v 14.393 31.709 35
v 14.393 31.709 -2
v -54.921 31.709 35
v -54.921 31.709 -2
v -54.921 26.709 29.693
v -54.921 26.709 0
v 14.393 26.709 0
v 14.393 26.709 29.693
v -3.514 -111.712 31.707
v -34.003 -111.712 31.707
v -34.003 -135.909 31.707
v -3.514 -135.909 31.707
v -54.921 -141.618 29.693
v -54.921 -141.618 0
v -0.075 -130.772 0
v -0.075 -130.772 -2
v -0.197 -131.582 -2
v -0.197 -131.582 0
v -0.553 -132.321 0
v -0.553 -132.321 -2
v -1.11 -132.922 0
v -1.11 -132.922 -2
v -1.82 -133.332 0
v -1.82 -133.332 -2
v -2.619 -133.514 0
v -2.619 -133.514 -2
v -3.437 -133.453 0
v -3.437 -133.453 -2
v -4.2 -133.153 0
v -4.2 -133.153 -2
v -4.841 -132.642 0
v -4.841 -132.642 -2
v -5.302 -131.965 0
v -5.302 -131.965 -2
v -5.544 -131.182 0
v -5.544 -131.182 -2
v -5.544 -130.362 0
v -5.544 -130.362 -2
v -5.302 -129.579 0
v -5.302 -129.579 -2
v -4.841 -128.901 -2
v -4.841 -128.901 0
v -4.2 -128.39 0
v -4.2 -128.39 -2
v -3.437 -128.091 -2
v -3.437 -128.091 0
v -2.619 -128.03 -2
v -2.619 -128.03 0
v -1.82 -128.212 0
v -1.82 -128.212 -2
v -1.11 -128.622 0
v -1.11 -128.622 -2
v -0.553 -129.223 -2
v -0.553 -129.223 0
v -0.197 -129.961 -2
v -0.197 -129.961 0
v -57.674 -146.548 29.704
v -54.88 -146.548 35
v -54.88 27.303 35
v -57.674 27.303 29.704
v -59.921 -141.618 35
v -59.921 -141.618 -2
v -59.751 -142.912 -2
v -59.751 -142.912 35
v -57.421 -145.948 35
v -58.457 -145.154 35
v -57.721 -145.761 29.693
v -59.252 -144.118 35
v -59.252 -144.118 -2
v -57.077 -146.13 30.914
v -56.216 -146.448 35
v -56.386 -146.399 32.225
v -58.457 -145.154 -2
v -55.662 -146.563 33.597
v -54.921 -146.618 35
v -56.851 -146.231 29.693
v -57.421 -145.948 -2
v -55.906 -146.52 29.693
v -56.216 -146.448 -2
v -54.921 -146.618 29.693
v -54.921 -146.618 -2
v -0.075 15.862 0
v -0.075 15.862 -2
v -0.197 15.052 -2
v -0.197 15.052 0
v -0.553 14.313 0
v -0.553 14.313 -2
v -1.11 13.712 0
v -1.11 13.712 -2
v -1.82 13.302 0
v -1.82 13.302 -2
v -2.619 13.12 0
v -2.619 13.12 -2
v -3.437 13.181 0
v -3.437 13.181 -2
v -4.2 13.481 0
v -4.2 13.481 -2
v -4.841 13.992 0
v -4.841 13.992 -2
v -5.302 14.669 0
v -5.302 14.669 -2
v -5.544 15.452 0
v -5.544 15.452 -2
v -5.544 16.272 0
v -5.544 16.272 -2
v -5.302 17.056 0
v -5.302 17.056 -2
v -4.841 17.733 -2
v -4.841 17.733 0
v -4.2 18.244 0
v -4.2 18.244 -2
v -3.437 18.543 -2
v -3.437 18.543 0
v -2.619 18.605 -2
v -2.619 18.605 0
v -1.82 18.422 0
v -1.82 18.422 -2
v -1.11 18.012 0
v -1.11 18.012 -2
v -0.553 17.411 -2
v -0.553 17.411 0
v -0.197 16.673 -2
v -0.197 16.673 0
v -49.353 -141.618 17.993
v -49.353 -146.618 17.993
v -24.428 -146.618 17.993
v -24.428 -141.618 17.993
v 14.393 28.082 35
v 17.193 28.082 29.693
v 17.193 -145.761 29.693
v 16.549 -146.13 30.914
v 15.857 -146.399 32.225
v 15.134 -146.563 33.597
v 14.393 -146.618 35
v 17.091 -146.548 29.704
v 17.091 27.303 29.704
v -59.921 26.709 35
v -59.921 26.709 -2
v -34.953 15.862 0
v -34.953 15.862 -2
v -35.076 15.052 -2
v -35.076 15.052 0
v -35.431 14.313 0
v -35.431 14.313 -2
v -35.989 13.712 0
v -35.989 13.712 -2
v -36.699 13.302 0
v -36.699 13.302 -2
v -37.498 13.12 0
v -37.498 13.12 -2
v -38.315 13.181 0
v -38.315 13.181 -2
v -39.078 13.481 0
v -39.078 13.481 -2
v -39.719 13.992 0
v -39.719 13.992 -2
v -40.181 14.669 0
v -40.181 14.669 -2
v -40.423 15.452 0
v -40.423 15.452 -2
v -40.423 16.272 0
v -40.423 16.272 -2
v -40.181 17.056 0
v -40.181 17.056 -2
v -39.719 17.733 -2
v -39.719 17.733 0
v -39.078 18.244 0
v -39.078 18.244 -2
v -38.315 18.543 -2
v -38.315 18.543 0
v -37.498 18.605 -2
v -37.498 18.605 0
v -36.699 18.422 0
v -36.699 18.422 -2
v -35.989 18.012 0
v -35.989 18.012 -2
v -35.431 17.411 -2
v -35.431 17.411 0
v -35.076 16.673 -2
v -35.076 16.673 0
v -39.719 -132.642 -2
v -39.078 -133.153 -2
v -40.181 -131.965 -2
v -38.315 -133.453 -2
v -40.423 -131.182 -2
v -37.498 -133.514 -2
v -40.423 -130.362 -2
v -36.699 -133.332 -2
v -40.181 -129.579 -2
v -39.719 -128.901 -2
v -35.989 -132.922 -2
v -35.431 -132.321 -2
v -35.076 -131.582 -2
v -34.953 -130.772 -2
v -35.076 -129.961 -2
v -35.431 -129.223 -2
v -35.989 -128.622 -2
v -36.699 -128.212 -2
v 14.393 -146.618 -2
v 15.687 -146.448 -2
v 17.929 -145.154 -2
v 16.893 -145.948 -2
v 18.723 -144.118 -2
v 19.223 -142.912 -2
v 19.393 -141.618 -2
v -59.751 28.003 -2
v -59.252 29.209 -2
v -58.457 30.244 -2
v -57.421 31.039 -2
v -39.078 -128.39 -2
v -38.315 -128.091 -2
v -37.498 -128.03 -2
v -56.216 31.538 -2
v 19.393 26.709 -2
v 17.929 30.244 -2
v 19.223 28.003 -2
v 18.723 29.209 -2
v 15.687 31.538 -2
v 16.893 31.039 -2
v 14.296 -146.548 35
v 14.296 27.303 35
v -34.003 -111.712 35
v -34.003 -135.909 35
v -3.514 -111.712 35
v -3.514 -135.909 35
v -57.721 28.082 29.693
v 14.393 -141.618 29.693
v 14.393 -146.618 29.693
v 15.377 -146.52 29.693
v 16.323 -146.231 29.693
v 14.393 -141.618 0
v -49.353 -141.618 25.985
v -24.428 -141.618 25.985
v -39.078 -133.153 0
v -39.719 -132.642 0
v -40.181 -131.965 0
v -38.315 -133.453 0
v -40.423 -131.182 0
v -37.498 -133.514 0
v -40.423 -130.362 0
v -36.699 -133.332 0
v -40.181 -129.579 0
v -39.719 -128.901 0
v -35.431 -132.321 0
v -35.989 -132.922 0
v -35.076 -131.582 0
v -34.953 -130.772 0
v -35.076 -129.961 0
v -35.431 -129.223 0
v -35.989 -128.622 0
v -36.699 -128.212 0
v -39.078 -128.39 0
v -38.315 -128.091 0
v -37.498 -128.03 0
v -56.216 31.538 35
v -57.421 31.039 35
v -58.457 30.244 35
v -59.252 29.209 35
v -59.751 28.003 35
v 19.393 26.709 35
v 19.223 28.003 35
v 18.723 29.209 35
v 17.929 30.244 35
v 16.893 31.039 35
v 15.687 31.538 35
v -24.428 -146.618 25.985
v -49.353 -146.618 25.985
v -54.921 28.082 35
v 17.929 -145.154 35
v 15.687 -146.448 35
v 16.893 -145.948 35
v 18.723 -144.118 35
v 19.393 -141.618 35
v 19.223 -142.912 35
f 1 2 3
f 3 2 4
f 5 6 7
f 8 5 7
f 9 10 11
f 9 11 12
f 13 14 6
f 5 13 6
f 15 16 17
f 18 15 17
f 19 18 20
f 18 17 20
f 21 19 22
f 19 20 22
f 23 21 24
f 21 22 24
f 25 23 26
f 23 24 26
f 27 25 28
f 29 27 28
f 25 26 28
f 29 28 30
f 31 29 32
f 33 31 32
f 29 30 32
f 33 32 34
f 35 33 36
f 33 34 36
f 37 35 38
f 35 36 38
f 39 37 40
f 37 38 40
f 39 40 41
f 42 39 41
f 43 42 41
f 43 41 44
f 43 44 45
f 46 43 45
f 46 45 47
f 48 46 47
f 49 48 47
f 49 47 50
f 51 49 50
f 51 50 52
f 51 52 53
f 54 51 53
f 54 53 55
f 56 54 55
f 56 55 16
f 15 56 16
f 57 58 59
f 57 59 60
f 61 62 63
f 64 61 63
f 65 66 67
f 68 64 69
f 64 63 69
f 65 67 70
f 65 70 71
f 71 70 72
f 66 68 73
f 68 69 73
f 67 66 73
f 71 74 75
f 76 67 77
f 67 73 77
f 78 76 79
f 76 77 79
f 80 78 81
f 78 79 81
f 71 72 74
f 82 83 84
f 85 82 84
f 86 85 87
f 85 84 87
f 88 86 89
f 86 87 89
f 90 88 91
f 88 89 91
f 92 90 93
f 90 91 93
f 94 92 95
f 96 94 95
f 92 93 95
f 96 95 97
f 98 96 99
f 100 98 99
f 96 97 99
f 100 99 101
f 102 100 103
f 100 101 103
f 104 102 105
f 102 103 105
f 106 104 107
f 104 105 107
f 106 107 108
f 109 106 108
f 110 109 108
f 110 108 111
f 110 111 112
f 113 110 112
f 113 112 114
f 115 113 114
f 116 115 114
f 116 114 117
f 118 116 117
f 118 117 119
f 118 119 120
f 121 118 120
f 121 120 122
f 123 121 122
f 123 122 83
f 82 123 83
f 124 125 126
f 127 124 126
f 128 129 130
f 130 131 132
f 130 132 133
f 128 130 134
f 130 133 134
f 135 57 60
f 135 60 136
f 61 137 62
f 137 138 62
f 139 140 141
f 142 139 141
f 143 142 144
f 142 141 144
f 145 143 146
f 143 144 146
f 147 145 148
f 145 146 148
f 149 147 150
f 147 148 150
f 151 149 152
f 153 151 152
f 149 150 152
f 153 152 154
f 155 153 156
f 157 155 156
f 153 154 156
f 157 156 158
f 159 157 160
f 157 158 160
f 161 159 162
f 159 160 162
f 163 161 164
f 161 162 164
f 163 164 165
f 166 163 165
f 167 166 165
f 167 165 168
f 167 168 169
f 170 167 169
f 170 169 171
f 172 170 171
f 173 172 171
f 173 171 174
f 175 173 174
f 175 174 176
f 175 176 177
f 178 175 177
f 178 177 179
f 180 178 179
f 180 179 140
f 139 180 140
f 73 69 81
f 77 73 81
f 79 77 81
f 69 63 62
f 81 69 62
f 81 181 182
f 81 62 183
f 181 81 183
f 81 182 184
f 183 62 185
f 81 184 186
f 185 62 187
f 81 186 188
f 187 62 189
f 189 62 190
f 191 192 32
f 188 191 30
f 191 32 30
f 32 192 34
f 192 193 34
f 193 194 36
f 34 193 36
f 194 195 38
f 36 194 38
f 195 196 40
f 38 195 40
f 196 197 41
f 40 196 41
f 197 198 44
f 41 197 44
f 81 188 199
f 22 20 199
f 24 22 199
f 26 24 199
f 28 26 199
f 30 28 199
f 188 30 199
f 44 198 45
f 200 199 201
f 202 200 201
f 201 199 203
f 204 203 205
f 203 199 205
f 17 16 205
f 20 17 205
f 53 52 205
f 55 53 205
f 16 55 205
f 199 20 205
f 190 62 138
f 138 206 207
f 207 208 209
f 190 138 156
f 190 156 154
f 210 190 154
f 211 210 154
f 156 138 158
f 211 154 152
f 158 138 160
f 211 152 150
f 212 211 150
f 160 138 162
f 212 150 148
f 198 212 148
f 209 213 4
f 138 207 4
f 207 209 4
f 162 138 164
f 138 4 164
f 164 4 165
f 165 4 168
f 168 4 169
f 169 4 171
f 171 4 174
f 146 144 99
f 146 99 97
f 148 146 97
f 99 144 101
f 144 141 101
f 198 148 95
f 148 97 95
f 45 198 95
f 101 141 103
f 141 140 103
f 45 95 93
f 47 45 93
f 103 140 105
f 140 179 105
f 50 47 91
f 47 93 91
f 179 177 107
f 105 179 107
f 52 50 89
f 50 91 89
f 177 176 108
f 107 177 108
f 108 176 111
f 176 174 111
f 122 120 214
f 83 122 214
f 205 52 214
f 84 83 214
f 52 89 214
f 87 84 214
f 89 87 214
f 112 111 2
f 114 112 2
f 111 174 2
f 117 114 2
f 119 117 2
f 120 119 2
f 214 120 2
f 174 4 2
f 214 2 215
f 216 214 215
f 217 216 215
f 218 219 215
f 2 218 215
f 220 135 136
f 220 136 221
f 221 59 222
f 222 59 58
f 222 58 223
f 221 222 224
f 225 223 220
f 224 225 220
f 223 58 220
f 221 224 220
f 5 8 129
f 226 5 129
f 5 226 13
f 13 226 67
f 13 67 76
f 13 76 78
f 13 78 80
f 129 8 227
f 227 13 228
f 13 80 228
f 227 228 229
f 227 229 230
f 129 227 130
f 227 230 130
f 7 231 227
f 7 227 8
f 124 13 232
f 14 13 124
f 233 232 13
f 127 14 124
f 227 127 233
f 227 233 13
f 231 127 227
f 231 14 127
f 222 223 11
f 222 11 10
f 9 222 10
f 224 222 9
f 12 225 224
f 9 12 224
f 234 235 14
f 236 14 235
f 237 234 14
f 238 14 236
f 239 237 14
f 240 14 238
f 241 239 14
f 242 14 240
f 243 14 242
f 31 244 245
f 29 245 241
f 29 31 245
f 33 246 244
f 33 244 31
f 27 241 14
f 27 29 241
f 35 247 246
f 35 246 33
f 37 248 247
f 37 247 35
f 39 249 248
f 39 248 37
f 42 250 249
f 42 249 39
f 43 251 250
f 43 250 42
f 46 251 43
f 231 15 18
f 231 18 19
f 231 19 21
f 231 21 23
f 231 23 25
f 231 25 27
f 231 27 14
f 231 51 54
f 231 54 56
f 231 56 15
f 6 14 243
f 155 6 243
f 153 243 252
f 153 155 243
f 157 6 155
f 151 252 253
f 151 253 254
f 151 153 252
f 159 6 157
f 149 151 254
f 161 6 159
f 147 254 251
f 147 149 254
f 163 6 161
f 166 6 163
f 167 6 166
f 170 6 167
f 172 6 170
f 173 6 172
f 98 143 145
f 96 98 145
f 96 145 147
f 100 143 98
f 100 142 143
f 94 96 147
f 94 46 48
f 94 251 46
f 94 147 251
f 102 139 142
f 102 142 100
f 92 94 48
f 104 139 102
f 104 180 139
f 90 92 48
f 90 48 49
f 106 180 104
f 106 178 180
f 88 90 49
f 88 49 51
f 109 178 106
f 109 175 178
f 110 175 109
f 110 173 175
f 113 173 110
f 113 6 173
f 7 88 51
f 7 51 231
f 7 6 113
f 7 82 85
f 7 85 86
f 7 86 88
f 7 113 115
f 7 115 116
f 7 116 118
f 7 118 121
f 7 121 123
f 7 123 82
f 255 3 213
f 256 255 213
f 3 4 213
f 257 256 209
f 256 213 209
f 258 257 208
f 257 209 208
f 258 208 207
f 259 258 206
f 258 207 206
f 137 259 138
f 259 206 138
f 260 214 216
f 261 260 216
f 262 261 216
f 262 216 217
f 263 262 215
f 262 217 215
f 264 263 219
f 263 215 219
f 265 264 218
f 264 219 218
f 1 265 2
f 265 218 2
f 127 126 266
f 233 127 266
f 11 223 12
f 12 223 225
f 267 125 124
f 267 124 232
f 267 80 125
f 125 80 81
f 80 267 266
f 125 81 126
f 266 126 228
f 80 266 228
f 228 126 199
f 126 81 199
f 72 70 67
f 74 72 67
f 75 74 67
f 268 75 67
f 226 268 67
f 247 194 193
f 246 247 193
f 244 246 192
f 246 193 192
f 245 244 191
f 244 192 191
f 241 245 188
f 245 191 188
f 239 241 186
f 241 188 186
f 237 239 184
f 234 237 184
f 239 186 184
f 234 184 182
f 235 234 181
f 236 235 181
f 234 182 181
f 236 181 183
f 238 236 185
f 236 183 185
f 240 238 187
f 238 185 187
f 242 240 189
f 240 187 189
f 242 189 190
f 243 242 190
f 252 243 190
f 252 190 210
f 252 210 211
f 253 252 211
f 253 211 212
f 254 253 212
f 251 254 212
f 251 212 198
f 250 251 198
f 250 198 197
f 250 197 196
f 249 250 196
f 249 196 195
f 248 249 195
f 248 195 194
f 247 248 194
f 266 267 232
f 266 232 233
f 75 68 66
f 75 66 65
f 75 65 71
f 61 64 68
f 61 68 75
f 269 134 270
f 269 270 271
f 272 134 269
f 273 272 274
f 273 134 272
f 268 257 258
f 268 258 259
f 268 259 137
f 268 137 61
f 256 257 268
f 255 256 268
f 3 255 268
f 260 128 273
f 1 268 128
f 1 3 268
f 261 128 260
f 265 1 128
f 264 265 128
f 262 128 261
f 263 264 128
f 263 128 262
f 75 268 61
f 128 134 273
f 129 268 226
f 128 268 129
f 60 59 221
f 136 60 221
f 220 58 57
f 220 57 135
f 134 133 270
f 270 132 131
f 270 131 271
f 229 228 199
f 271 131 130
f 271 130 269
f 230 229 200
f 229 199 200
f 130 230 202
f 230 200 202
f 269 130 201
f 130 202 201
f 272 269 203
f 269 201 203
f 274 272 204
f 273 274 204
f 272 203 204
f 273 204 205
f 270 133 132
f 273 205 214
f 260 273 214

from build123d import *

# Parameters (mm, degrees)
F0_W      = 69.3147265166
F0_H      = 168.3268749714
F1_DEPTH  = 2
F2_DEPTH  = 35
F3_W      = 24.9247029424
F3_H      = 7.9923868179
F4_DEPTH  = 25
F5_W      = 69.3147265166
F5_H      = 5.3065996646
F6_DEPTH  = 174.7
F7_DEPTH  = 174.2
F8_W      = 30.5498873349
F8_H      = 24.2458432913
F9_DEPTH  = 3.3
F10_SCALE = 0.998
F11_R     = 2.75
F12_DEPTH = 25


with BuildPart() as f1:
    # F0 (on Top) → F1 (new body)
    with BuildSketch(Plane.XY):
        with BuildLine():
            Line((14.3932905048, 31.7087098956), (-54.9214360118, 31.7087098956))
            ThreePointArc((-54.9214360118, 31.7087098956), (-58.4569699177, 30.2442438015), (-59.9214360118, 26.7087098956))
            Line((-59.9214360118, 26.7087098956), (-59.9214360118, -141.6181650758))
            ThreePointArc((-59.9214360118, -141.6181650758), (-58.4569699177, -145.1536989817), (-54.9214360118, -146.6181650758))
            Line((-54.9214360118, -146.6181650758), (14.3932905048, -146.6181650758))
            ThreePointArc((14.3932905048, -146.6181650758), (17.9288244107, -145.1536989817), (19.3932905048, -141.6181650758))
            Line((19.3932905048, -141.6181650758), (19.3932905048, 26.7087098956))
            ThreePointArc((19.3932905048, 26.7087098956), (17.9288244107, 30.2442438015), (14.3932905048, 31.7087098956))
        make_face()
        with Locations((-20.2640727535, -57.4547275901)):
            Rectangle(F0_W, F0_H, mode=Mode.SUBTRACT)
        with Locations((-20.2640727535, -57.4547275901)):
            Rectangle(F0_W, F0_H)
    extrude(amount=-F1_DEPTH)

    # F0 (on Top) → F2 (join)
    with BuildSketch(Plane.XY):
        with BuildLine():
            Line((14.3932905048, 31.7087098956), (-54.9214360118, 31.7087098956))
            ThreePointArc((-54.9214360118, 31.7087098956), (-58.4569699177, 30.2442438015), (-59.9214360118, 26.7087098956))
            Line((-59.9214360118, 26.7087098956), (-59.9214360118, -141.6181650758))
            ThreePointArc((-59.9214360118, -141.6181650758), (-58.4569699177, -145.1536989817), (-54.9214360118, -146.6181650758))
            Line((-54.9214360118, -146.6181650758), (14.3932905048, -146.6181650758))
            ThreePointArc((14.3932905048, -146.6181650758), (17.9288244107, -145.1536989817), (19.3932905048, -141.6181650758))
            Line((19.3932905048, -141.6181650758), (19.3932905048, 26.7087098956))
            ThreePointArc((19.3932905048, 26.7087098956), (17.9288244107, 30.2442438015), (14.3932905048, 31.7087098956))
        make_face()
        with Locations((-20.2640727535, -57.4547275901)):
            Rectangle(F0_W, F0_H, mode=Mode.SUBTRACT)
    extrude(amount=F2_DEPTH)

    # F3 (on face) → F4 (cut)
    with BuildSketch(Plane.XZ.offset(146.6181650758)):
        with Locations((-36.8908047676, 21.9889543951)):
            Rectangle(F3_W, F3_H)
    extrude(amount=-F4_DEPTH, mode=Mode.SUBTRACT)

    # F5 (on face) → F6 (cut)
    with BuildSketch(Plane.XZ.offset(146.6181650758)):
        Polygon((-57.7214360118, 29.6934003354), (-54.9214360118, 29.6934003354), (-54.9214360118, 35), align=None)
        with Locations((-20.2640727535, 32.3467001677)):
            Rectangle(F5_W, F5_H)
        Polygon((14.3932905048, 35), (14.3932905048, 29.6934003354), (17.1932905048, 29.6934003354), align=None)
    extrude(amount=-F6_DEPTH, mode=Mode.SUBTRACT)

    # F11 (on face) → F12 (cut)
    with BuildSketch(Plane(origin=(0, 0, -2), x_dir=(1, 0, 0), z_dir=(0, 0, -1))):
        with Locations((-37.7034781314, 130.7718157768)):
            Circle(F11_R)
        with Locations((-2.8246673755, 130.7718157768)):
            Circle(F11_R)
        with Locations((-37.7034781314, -15.8623605967)):
            Circle(F11_R)
        with Locations((-2.8246673755, -15.8623605967)):
            Circle(F11_R)
    extrude(amount=-F12_DEPTH, mode=Mode.SUBTRACT)


with BuildPart() as f7:
    # F5 (on face) → F7 (new body)
    with BuildSketch(Plane.XZ.offset(146.6181650758)):
        with Locations((-20.2640727535, 32.3467001677)):
            Rectangle(F5_W, F5_H)
        Polygon((-57.7214360118, 29.6934003354), (-54.9214360118, 29.6934003354), (-54.9214360118, 35), align=None)
        Polygon((14.3932905048, 35), (14.3932905048, 29.6934003354), (17.1932905048, 29.6934003354), align=None)
    extrude(amount=-F7_DEPTH)

    # F8 (on face) → F9 (cut)
    with BuildSketch(Plane.XY.offset(35)):
        with Locations((-18.7282656552, -123.8348558545)):
            Rectangle(F8_W, F8_H)
    extrude(amount=-F9_DEPTH, mode=Mode.SUBTRACT)


with BuildPart() as f7_1:
    # F10: moved
    add(f7.part.scale(F10_SCALE).moved(Location((-0.0680064186, -0.2234238684, 0.07))))


solid = Compound([f1.part, f7_1.part])
